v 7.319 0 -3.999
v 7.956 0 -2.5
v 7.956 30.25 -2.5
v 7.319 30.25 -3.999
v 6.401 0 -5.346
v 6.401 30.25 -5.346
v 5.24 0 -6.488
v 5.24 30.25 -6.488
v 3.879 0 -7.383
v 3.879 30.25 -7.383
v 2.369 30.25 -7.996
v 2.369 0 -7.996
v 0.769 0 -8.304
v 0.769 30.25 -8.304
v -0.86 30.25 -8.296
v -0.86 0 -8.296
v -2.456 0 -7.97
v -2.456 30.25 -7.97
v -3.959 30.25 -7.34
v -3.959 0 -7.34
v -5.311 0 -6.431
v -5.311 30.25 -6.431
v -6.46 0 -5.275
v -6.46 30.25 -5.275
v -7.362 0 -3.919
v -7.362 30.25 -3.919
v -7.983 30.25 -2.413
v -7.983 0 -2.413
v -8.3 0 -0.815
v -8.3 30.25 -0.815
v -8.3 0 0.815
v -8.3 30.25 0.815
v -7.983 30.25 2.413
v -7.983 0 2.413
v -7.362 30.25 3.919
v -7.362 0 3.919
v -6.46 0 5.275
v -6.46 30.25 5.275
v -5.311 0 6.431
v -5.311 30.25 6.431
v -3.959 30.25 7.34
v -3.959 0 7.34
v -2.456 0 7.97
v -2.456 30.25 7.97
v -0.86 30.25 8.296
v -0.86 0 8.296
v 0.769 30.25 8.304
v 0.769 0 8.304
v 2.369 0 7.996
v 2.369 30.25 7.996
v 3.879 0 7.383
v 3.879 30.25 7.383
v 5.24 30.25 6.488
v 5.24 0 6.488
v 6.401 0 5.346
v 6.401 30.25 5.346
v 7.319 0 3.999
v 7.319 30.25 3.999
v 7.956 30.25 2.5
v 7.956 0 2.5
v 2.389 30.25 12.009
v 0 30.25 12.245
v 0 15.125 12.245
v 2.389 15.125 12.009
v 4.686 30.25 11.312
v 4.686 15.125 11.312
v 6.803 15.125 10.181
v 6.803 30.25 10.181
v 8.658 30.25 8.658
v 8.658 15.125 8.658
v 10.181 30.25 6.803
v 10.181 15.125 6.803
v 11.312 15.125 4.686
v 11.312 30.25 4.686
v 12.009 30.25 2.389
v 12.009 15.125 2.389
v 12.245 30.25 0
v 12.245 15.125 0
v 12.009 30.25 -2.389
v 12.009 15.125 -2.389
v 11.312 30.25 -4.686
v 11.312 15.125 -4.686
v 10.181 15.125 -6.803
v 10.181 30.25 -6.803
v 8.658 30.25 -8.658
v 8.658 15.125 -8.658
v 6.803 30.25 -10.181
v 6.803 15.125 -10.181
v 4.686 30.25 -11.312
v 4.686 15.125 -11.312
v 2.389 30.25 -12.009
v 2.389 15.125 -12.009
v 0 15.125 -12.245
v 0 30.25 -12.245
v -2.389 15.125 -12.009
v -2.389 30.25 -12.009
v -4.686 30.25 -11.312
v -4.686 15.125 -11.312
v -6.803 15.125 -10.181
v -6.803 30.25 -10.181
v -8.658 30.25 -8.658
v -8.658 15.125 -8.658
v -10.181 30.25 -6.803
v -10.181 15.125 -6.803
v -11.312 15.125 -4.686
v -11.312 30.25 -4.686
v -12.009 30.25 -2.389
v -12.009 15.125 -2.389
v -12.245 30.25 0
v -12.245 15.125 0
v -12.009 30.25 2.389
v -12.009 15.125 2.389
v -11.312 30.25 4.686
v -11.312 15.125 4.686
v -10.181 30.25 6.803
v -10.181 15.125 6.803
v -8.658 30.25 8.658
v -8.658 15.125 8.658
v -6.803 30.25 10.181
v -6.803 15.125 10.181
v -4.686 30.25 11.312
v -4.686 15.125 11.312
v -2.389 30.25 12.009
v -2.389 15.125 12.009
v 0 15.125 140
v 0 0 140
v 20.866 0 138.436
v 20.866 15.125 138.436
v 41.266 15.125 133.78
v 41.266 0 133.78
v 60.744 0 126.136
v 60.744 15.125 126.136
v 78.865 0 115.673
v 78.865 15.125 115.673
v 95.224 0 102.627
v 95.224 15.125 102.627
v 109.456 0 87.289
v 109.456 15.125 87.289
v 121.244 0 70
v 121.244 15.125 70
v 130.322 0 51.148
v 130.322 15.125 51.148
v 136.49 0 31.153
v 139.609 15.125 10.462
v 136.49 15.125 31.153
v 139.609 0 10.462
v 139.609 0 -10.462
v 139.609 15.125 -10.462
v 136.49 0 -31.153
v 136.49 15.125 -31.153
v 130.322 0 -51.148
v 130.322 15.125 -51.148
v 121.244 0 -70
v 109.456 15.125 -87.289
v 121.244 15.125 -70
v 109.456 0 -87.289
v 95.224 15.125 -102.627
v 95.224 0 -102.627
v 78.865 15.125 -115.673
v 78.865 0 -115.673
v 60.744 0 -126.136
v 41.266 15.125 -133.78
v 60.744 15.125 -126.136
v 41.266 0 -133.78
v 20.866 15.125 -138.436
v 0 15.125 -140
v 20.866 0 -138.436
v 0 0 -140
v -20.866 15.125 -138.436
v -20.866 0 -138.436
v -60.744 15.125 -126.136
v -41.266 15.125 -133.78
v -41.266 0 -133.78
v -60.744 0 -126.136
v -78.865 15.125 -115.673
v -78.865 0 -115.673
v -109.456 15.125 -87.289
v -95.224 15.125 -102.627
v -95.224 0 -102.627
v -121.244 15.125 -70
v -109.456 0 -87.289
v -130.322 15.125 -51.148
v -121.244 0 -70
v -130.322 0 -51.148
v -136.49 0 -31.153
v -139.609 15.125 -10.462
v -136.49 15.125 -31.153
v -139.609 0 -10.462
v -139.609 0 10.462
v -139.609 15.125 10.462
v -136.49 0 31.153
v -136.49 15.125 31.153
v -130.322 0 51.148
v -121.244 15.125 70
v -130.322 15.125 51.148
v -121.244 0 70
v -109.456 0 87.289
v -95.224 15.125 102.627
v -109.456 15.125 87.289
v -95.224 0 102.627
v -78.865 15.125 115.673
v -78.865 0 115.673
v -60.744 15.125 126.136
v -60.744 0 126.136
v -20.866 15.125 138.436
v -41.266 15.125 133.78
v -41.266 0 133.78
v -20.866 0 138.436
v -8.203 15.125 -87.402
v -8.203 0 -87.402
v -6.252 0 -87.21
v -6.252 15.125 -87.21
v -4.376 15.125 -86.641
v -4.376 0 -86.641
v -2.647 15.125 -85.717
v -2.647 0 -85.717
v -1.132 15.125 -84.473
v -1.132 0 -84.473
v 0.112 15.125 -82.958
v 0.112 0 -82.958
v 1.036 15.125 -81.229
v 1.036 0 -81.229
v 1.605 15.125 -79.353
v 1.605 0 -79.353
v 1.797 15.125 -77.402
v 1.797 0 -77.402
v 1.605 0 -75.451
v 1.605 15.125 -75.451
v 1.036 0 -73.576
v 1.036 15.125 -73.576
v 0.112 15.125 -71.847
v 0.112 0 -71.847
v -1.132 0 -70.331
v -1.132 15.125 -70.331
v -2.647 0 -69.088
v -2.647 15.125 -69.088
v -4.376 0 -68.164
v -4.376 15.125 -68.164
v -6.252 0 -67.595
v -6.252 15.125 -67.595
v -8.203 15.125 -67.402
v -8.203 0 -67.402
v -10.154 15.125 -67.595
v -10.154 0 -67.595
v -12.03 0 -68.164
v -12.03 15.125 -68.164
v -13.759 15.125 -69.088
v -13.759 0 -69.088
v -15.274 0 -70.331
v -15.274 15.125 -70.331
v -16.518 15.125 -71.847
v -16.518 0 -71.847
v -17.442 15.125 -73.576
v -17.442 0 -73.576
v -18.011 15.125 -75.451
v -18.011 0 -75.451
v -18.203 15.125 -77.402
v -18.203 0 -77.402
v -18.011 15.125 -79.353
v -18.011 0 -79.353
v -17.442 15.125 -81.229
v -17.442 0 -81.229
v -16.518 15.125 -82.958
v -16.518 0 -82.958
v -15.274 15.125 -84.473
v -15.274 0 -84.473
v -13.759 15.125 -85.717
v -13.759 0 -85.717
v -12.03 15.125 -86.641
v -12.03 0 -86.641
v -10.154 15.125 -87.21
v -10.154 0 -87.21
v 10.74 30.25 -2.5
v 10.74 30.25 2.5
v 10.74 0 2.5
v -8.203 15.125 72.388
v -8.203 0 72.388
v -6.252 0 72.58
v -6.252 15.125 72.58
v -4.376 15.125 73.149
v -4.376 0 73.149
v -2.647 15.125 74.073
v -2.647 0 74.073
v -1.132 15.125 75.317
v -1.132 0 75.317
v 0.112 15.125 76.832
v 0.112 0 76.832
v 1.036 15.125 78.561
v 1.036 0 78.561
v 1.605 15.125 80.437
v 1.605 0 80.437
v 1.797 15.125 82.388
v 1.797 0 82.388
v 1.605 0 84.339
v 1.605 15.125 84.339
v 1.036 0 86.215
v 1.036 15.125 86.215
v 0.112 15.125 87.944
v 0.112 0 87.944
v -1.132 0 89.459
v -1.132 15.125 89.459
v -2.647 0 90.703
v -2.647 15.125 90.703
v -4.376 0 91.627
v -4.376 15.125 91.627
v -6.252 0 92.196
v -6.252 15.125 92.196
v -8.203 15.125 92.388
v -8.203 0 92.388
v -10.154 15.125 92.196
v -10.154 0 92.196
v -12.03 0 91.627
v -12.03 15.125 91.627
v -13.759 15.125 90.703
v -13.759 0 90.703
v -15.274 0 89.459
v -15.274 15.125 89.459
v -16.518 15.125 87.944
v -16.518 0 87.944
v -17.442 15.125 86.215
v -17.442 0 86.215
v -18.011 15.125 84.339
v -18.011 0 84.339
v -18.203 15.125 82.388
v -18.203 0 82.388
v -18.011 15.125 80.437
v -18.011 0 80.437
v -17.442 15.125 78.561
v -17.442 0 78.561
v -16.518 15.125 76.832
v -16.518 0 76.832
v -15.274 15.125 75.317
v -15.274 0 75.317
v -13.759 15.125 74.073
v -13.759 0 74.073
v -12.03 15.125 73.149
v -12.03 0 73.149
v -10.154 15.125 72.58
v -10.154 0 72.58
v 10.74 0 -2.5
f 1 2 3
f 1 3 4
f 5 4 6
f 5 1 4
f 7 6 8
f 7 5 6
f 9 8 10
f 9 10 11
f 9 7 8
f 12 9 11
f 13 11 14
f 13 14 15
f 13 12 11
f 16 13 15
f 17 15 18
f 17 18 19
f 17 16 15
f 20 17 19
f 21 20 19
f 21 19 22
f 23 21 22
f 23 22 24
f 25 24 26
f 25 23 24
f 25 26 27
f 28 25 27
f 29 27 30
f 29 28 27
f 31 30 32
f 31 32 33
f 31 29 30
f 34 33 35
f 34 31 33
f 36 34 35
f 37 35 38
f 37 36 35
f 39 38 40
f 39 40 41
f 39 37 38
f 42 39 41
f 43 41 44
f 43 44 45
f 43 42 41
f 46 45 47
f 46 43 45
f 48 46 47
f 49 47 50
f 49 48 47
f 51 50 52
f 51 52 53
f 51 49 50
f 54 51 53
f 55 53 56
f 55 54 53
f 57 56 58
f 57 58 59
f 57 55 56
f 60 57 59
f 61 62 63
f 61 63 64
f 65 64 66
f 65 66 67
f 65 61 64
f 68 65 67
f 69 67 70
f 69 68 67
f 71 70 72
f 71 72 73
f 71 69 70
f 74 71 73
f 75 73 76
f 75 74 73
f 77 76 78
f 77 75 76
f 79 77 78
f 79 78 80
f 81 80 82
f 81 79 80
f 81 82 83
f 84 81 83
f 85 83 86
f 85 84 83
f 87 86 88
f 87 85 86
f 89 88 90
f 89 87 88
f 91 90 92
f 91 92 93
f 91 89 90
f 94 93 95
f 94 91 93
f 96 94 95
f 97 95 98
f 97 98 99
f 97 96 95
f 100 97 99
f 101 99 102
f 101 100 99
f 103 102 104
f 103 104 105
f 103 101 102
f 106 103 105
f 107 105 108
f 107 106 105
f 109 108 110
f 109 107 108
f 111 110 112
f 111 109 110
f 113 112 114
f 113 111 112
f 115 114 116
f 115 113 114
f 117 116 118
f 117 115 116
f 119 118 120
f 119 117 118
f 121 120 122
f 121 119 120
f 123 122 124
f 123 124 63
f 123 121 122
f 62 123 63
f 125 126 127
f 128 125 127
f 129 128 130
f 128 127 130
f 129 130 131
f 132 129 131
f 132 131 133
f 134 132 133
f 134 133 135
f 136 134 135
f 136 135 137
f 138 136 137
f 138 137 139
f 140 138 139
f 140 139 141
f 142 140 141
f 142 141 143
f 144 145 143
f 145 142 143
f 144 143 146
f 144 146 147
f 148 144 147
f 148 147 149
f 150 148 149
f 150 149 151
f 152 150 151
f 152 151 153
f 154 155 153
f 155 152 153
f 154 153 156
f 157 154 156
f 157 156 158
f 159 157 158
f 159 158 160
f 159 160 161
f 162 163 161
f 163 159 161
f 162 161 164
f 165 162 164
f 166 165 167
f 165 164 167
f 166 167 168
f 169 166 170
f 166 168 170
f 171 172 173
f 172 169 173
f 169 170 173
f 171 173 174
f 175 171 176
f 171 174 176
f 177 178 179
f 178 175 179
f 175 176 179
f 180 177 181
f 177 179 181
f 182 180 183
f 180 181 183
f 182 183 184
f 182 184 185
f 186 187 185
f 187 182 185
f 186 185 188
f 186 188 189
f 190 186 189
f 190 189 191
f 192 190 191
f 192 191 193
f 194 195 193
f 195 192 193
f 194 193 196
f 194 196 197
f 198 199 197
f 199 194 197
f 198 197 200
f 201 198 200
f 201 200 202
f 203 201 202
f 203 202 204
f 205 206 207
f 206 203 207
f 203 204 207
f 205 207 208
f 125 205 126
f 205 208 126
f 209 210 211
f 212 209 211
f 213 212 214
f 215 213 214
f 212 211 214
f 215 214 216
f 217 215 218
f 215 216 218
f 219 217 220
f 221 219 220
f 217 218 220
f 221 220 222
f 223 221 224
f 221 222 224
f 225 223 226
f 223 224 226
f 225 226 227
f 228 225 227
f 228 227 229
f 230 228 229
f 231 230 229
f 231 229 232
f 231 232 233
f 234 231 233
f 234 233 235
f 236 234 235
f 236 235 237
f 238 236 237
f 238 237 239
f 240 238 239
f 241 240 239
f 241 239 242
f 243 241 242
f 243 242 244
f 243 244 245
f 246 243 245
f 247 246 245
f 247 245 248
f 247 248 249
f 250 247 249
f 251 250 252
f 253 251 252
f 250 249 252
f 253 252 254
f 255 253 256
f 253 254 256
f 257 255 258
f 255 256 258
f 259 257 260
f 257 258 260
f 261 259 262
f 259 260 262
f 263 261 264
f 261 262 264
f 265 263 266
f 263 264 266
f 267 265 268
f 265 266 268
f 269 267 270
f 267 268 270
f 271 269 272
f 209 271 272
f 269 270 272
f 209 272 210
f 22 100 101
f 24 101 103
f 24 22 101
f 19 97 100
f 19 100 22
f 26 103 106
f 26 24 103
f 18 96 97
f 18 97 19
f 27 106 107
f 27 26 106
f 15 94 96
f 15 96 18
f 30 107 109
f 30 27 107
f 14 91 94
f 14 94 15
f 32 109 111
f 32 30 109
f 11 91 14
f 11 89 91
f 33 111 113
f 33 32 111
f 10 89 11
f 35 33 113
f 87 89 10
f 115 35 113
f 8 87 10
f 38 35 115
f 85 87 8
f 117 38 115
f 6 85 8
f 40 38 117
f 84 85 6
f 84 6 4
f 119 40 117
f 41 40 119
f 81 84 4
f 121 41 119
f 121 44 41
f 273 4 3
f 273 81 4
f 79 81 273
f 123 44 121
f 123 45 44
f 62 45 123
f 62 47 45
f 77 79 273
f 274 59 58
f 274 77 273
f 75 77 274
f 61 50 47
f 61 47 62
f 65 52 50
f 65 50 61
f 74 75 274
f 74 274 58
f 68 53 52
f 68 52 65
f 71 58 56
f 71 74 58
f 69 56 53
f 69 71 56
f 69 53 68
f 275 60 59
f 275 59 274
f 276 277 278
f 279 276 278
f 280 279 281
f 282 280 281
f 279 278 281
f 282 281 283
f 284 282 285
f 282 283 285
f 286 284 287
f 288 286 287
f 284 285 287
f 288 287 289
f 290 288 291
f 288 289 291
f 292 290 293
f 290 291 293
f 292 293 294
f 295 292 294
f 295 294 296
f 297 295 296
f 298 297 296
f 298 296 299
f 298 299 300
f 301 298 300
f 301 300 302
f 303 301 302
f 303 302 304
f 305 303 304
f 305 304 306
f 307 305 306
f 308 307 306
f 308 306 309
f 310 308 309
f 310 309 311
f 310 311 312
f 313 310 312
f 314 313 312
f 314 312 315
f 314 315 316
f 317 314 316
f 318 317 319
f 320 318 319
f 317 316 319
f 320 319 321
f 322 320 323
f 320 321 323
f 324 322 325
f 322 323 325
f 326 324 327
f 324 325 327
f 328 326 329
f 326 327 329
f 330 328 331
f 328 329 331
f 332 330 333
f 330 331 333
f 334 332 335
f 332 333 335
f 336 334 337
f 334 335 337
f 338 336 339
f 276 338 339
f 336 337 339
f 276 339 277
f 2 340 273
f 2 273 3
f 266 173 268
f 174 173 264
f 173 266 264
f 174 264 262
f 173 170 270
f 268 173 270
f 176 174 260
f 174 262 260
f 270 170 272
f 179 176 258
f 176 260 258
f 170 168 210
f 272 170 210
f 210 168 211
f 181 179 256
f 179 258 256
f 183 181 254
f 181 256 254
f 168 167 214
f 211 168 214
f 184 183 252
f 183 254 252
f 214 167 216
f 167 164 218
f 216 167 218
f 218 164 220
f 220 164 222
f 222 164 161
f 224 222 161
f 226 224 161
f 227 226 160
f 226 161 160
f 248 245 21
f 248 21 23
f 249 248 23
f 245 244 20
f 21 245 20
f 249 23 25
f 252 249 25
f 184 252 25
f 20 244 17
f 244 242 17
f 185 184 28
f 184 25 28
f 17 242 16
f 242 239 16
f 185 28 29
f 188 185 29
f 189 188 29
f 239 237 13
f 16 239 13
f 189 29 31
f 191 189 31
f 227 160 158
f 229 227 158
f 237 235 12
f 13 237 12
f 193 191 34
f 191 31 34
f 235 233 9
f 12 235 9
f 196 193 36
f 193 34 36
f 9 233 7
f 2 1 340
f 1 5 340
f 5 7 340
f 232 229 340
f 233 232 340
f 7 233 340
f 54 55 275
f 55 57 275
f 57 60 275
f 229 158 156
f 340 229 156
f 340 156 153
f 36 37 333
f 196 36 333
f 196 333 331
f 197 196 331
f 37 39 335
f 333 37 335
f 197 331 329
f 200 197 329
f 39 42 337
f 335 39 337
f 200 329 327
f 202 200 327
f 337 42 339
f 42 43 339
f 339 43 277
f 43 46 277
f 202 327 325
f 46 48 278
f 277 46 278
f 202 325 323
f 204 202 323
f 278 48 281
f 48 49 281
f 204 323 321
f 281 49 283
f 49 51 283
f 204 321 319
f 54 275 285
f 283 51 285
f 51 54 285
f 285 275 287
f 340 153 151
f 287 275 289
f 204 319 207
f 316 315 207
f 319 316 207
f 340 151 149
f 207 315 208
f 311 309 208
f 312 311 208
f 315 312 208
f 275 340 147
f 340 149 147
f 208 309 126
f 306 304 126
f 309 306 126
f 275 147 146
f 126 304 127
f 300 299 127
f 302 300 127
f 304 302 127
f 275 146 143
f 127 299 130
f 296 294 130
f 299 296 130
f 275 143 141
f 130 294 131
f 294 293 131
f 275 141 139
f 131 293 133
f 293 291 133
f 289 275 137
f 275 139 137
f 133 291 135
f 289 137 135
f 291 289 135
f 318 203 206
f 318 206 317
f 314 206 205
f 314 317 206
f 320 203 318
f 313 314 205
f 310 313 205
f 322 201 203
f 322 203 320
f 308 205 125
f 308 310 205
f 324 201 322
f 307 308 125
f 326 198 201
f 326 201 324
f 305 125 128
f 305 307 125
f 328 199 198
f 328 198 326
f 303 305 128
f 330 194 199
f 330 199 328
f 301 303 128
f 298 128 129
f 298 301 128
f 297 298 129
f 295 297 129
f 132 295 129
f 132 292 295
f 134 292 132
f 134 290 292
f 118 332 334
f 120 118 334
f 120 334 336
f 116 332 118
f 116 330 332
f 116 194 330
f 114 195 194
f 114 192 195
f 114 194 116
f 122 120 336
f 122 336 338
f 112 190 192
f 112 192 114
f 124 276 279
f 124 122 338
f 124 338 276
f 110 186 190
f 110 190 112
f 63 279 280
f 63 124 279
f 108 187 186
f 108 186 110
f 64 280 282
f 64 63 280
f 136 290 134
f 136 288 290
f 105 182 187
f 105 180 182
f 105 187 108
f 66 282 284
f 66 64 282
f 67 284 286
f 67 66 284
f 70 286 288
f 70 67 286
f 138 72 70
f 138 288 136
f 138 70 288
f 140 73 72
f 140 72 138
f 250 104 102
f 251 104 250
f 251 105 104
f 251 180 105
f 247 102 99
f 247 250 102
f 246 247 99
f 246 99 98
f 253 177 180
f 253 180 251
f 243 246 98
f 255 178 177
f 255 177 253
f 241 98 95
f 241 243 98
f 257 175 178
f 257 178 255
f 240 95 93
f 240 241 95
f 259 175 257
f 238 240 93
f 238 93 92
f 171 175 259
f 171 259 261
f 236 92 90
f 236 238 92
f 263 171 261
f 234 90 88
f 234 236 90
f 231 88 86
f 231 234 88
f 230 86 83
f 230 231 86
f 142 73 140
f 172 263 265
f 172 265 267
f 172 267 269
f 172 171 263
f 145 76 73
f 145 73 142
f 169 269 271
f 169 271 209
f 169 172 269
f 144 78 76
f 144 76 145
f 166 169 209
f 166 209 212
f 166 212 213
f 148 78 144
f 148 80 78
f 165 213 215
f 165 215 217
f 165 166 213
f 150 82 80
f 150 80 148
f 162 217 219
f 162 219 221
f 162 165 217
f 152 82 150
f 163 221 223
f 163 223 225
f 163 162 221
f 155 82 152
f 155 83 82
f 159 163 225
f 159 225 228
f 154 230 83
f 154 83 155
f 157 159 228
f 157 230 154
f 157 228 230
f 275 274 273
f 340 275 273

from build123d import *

# Parameters (mm, degrees)
SKETCH1_R           = 140
BOSS_EXTRUDE1_DEPTH = 30.25
SKETCH2_R           = 36.5
SKETCH2_R_2         = 12.2445076
CUT_EXTRUDE1_DEPTH  = 15.125
SKETCH3_R           = 150
SKETCH3_R_2         = 12.938699975
CUT_EXTRUDE3_DEPTH  = 60
SKETCH4_R           = 10
CUT_EXTRUDE4_DEPTH  = 20


with BuildPart() as part:
    # Sketch1 → Boss-Extrude1 (new body)
    with BuildSketch(Plane(origin=(0, 0, 0), x_dir=(1, 0, 0), z_dir=(0, 1, 0))):
        with Locations(Location((0, 0, 0), (0, 0, 270))):
            Circle(SKETCH1_R)
        with BuildLine():
            Line((10.74, 0), (10.74, 2.5))
            Line((10.74, 2.5), (7.956481634, 2.5))
            ThreePointArc((7.956481634, 2.5), (-8.34, 0), (7.956481634, -2.5))
            Line((7.956481634, -2.5), (10.74, -2.5))
            Line((10.74, -2.5), (10.74, 0))
        make_face(mode=Mode.SUBTRACT)
    extrude(amount=BOSS_EXTRUDE1_DEPTH)

    # Sketch2 → Cut-Extrude1 (cut)
    with BuildSketch(Plane(origin=(0, 30.25, 0), x_dir=(1, 0, 0), z_dir=(0, 1, 0))):
        with Locations(Location((0, 0, 0), (0, 0, 270))):
            Circle(SKETCH2_R)
        with Locations(Location((0, 0, 0), (0, 0, 270))):
            Circle(SKETCH2_R_2, mode=Mode.SUBTRACT)
    extrude(amount=-CUT_EXTRUDE1_DEPTH, mode=Mode.SUBTRACT)

    # Sketch3 → Cut-Extrude3 (cut)
    with BuildSketch(Plane(origin=(0, 15.125, 0), x_dir=(1, 0, 0), z_dir=(0, 1, 0))):
        Circle(SKETCH3_R)
        Circle(SKETCH3_R_2, mode=Mode.SUBTRACT)
    extrude(amount=CUT_EXTRUDE3_DEPTH, mode=Mode.SUBTRACT)

    # Sketch4 → Cut-Extrude4 (cut)
    with BuildSketch(Plane(origin=(0, 0, 0), x_dir=(-1, 0, 0), z_dir=(0, -1, 0))):
        with Locations(Location((8.202870942, 77.402383207, 0), (0, 0, 90))):
            Circle(SKETCH4_R)
        with Locations(Location((8.202870942, -82.387978989, 0), (0, 0, 90))):
            Circle(SKETCH4_R)
    extrude(amount=-CUT_EXTRUDE4_DEPTH, mode=Mode.SUBTRACT)


solid = part.part
